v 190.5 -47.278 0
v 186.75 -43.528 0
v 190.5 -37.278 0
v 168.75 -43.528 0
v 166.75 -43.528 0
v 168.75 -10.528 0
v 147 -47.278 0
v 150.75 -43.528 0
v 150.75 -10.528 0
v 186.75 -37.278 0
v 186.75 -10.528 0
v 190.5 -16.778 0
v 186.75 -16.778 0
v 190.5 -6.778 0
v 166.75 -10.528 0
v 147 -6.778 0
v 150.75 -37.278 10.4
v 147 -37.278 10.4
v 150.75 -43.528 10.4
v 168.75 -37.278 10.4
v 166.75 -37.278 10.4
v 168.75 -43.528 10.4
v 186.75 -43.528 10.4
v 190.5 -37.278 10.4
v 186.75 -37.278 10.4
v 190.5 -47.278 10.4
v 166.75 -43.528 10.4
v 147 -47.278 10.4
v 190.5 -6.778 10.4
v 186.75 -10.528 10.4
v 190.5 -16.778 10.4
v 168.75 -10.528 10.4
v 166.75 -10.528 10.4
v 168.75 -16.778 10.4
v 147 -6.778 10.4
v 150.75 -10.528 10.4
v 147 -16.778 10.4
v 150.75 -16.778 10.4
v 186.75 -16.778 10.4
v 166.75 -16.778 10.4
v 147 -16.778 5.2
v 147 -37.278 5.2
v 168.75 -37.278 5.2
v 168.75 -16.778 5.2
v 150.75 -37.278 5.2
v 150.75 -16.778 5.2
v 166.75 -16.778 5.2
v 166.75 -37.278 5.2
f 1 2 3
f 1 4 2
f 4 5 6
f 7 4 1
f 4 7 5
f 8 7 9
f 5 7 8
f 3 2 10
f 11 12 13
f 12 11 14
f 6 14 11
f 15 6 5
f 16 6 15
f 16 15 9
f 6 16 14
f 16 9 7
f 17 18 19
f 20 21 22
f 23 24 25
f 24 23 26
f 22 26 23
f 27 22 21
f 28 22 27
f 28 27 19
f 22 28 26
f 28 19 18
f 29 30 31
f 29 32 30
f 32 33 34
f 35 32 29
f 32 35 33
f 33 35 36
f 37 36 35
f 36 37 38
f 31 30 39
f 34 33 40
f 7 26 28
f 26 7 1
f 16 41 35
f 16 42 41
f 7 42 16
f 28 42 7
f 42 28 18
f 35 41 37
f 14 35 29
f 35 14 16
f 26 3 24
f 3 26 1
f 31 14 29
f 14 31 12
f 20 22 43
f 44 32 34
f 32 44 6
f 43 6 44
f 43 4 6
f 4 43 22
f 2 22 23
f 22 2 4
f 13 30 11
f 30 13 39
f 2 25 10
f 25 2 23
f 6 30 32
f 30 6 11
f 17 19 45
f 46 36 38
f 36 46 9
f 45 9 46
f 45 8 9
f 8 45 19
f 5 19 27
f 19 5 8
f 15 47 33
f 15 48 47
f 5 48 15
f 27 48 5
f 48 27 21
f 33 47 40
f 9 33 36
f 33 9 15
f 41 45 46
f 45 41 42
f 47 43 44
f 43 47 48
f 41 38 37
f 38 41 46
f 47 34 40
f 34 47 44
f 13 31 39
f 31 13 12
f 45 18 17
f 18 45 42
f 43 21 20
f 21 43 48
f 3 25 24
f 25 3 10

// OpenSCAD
use <right-case.scad>


module quarter(x, y, z, y_cut_delta=0, x_cut_delta=0, offset=[0,0,0], piece) {
    tongue_size = 2.8;
    displacement = 12;
    // tolerance on the groove side
    kerf = 0.25;

    y_cut = (y / 2) + y_cut_delta;
    x_cut = (x / 2) + x_cut_delta;
    total_z = z * 2;

    module cutout(kerf=0) {
        rotate([90, 0, 0])
        cylinder(h=kerf + max(y + abs(y_cut_delta),
                              x + abs(x_cut_delta))/2,
                 r=tongue_size, $fn=4);
    }

    module tongue() {
        cutout();
    }

    module groove() {
        cutout(kerf);
    }

    module top_left_quadrant() {
        cube([x_cut, y_cut, total_z]);
    }

    module offset_top_right() {
        translate([x_cut, 0, 0]) children();
    }

    module top_right_quadrant() {
        offset_top_right()
        cube([x - x_cut, y_cut, total_z]);
    }

    module offset_bottom_left() {
        translate([0, y_cut, 0]) children();
    }

    module bottom_left_quadrant() {
        offset_bottom_left()
        cube([x_cut, y - y_cut, total_z]);
    }

    module offset_bottom_right() {
        translate([x_cut, y_cut, 0]) children();
    }

    module bottom_right_quadrant() {
        offset_bottom_right()
        cube([x - x_cut, y - y_cut, total_z]);
    }

    module offset_top_left_lr() {
      offset_top_right()
      translate([0, y_cut, z/2])
      children();
    }

    module offset_bottom_left_lr() {
      offset_bottom_left()
      translate([x - x_cut, y - y_cut, z/2])
      children();
    }

    module offset_top_left_ud() {
      translate([0, y_cut, z/2])
      rotate([0, 0, 90])
      children();
    }

    module offset_top_right_ud() {
      offset_bottom_right()
      translate([0, 0, z/2])
      rotate([0, 0, 90])
      children();
    }

    // top left quadrant
    if (piece == undef || piece == 0)
    translate([-displacement, -displacement, 0]) {
      intersection() {
        translate(offset) {
          difference() {
            union() {
              top_left_quadrant();
              // RHS tongue
              intersection() {
                top_right_quadrant();
                offset_top_left_lr() tongue();
              }
            }
            // bottom groove
            offset_top_left_ud() groove();
          }
        }
        children(0);
      }
    }

    // top right quadrant
    if (piece == undef || piece == 1)
    translate([displacement, -displacement, 0]) {
      intersection() {
        translate(offset) {
          difference() {
            union() {
              top_right_quadrant();
              // bottom tongue
              intersection() {
                bottom_right_quadrant();
                offset_top_right_ud() tongue();
              }
            }
            // LHS groove
            offset_top_left_lr() groove();
          }
        }
        children(0);
      }
    }

    // bottom right quadrant
    if (piece == undef || piece == 2)
    translate([displacement, displacement, 0]) {
      intersection() {
        translate(offset) {
          difference() {
            union() {
              bottom_right_quadrant();
              // LHS tongue
              intersection() {
                bottom_left_quadrant();
                offset_bottom_left_lr() tongue();
              }
            }
            // top groove
            offset_top_right_ud() groove();
          }
        }
        children(0);
      }
    }

    // bottom left quadrant
    if (piece == undef || piece == 3)
    translate([-displacement, displacement, 0]) {
      intersection() {
        translate(offset) {
          difference() {
            union() {
              bottom_left_quadrant();
              // top tongue
              intersection() {
                top_left_quadrant();
                offset_top_left_ud() tongue();
              }
            }
            // RHS groove
            offset_bottom_left_lr() groove();
          }
        }
        children(0);
      }
    }
}


mirror([0, 1, 0]) {

translate(v=[0, -74.97163836590344, 0]) {
translate(v=[89.00000000000001, 0, 0]) {
difference() {
difference() {
linear_extrude(height=10.4) {
polygon([
  [101.5, 81.75],
  [58.0, 81.75],
  [58.0, 122.25],
  [101.5, 122.25],
  [101.5, 81.75],
  [97.75, 85.5],
  [97.75, 118.5],
  [79.75, 118.5],
  [79.75, 85.5],
  [97.75, 85.5],
  [77.75, 118.5],
  [61.75, 118.5],
  [61.75, 85.5],
  [77.75, 85.5],
  [77.75, 118.5]
  ], [
  [
  0,
  1,
  2,
  3,
  4
  ],
  [
  5,
  6,
  7,
  8,
  9
  ],
  [
  10,
  11,
  12,
  13,
  14
  ]
  ]);

}
translate(v=[0, 0, 5.2]) {
linear_extrude(height=5.2) {
polygon([
  [101.75, 91.75],
  [101.75, 112.25],
  [57.75, 112.25],
  [57.75, 91.75],
  [101.75, 91.75]
  ], [
  [
  0,
  1,
  2,
  3,
  4
  ]
  ]);

}
}
}
linear_extrude(height=5.2) {
polygon([
  [101.75, 91.75],
  [101.75, 112.25],
  [87.08333333333333, 112.25],
  [87.08333333333333, 91.75],
  [101.75, 91.75]
  ], [
  [
  0,
  1,
  2,
  3,
  4
  ]
  ]);

}
}
}
}
}
